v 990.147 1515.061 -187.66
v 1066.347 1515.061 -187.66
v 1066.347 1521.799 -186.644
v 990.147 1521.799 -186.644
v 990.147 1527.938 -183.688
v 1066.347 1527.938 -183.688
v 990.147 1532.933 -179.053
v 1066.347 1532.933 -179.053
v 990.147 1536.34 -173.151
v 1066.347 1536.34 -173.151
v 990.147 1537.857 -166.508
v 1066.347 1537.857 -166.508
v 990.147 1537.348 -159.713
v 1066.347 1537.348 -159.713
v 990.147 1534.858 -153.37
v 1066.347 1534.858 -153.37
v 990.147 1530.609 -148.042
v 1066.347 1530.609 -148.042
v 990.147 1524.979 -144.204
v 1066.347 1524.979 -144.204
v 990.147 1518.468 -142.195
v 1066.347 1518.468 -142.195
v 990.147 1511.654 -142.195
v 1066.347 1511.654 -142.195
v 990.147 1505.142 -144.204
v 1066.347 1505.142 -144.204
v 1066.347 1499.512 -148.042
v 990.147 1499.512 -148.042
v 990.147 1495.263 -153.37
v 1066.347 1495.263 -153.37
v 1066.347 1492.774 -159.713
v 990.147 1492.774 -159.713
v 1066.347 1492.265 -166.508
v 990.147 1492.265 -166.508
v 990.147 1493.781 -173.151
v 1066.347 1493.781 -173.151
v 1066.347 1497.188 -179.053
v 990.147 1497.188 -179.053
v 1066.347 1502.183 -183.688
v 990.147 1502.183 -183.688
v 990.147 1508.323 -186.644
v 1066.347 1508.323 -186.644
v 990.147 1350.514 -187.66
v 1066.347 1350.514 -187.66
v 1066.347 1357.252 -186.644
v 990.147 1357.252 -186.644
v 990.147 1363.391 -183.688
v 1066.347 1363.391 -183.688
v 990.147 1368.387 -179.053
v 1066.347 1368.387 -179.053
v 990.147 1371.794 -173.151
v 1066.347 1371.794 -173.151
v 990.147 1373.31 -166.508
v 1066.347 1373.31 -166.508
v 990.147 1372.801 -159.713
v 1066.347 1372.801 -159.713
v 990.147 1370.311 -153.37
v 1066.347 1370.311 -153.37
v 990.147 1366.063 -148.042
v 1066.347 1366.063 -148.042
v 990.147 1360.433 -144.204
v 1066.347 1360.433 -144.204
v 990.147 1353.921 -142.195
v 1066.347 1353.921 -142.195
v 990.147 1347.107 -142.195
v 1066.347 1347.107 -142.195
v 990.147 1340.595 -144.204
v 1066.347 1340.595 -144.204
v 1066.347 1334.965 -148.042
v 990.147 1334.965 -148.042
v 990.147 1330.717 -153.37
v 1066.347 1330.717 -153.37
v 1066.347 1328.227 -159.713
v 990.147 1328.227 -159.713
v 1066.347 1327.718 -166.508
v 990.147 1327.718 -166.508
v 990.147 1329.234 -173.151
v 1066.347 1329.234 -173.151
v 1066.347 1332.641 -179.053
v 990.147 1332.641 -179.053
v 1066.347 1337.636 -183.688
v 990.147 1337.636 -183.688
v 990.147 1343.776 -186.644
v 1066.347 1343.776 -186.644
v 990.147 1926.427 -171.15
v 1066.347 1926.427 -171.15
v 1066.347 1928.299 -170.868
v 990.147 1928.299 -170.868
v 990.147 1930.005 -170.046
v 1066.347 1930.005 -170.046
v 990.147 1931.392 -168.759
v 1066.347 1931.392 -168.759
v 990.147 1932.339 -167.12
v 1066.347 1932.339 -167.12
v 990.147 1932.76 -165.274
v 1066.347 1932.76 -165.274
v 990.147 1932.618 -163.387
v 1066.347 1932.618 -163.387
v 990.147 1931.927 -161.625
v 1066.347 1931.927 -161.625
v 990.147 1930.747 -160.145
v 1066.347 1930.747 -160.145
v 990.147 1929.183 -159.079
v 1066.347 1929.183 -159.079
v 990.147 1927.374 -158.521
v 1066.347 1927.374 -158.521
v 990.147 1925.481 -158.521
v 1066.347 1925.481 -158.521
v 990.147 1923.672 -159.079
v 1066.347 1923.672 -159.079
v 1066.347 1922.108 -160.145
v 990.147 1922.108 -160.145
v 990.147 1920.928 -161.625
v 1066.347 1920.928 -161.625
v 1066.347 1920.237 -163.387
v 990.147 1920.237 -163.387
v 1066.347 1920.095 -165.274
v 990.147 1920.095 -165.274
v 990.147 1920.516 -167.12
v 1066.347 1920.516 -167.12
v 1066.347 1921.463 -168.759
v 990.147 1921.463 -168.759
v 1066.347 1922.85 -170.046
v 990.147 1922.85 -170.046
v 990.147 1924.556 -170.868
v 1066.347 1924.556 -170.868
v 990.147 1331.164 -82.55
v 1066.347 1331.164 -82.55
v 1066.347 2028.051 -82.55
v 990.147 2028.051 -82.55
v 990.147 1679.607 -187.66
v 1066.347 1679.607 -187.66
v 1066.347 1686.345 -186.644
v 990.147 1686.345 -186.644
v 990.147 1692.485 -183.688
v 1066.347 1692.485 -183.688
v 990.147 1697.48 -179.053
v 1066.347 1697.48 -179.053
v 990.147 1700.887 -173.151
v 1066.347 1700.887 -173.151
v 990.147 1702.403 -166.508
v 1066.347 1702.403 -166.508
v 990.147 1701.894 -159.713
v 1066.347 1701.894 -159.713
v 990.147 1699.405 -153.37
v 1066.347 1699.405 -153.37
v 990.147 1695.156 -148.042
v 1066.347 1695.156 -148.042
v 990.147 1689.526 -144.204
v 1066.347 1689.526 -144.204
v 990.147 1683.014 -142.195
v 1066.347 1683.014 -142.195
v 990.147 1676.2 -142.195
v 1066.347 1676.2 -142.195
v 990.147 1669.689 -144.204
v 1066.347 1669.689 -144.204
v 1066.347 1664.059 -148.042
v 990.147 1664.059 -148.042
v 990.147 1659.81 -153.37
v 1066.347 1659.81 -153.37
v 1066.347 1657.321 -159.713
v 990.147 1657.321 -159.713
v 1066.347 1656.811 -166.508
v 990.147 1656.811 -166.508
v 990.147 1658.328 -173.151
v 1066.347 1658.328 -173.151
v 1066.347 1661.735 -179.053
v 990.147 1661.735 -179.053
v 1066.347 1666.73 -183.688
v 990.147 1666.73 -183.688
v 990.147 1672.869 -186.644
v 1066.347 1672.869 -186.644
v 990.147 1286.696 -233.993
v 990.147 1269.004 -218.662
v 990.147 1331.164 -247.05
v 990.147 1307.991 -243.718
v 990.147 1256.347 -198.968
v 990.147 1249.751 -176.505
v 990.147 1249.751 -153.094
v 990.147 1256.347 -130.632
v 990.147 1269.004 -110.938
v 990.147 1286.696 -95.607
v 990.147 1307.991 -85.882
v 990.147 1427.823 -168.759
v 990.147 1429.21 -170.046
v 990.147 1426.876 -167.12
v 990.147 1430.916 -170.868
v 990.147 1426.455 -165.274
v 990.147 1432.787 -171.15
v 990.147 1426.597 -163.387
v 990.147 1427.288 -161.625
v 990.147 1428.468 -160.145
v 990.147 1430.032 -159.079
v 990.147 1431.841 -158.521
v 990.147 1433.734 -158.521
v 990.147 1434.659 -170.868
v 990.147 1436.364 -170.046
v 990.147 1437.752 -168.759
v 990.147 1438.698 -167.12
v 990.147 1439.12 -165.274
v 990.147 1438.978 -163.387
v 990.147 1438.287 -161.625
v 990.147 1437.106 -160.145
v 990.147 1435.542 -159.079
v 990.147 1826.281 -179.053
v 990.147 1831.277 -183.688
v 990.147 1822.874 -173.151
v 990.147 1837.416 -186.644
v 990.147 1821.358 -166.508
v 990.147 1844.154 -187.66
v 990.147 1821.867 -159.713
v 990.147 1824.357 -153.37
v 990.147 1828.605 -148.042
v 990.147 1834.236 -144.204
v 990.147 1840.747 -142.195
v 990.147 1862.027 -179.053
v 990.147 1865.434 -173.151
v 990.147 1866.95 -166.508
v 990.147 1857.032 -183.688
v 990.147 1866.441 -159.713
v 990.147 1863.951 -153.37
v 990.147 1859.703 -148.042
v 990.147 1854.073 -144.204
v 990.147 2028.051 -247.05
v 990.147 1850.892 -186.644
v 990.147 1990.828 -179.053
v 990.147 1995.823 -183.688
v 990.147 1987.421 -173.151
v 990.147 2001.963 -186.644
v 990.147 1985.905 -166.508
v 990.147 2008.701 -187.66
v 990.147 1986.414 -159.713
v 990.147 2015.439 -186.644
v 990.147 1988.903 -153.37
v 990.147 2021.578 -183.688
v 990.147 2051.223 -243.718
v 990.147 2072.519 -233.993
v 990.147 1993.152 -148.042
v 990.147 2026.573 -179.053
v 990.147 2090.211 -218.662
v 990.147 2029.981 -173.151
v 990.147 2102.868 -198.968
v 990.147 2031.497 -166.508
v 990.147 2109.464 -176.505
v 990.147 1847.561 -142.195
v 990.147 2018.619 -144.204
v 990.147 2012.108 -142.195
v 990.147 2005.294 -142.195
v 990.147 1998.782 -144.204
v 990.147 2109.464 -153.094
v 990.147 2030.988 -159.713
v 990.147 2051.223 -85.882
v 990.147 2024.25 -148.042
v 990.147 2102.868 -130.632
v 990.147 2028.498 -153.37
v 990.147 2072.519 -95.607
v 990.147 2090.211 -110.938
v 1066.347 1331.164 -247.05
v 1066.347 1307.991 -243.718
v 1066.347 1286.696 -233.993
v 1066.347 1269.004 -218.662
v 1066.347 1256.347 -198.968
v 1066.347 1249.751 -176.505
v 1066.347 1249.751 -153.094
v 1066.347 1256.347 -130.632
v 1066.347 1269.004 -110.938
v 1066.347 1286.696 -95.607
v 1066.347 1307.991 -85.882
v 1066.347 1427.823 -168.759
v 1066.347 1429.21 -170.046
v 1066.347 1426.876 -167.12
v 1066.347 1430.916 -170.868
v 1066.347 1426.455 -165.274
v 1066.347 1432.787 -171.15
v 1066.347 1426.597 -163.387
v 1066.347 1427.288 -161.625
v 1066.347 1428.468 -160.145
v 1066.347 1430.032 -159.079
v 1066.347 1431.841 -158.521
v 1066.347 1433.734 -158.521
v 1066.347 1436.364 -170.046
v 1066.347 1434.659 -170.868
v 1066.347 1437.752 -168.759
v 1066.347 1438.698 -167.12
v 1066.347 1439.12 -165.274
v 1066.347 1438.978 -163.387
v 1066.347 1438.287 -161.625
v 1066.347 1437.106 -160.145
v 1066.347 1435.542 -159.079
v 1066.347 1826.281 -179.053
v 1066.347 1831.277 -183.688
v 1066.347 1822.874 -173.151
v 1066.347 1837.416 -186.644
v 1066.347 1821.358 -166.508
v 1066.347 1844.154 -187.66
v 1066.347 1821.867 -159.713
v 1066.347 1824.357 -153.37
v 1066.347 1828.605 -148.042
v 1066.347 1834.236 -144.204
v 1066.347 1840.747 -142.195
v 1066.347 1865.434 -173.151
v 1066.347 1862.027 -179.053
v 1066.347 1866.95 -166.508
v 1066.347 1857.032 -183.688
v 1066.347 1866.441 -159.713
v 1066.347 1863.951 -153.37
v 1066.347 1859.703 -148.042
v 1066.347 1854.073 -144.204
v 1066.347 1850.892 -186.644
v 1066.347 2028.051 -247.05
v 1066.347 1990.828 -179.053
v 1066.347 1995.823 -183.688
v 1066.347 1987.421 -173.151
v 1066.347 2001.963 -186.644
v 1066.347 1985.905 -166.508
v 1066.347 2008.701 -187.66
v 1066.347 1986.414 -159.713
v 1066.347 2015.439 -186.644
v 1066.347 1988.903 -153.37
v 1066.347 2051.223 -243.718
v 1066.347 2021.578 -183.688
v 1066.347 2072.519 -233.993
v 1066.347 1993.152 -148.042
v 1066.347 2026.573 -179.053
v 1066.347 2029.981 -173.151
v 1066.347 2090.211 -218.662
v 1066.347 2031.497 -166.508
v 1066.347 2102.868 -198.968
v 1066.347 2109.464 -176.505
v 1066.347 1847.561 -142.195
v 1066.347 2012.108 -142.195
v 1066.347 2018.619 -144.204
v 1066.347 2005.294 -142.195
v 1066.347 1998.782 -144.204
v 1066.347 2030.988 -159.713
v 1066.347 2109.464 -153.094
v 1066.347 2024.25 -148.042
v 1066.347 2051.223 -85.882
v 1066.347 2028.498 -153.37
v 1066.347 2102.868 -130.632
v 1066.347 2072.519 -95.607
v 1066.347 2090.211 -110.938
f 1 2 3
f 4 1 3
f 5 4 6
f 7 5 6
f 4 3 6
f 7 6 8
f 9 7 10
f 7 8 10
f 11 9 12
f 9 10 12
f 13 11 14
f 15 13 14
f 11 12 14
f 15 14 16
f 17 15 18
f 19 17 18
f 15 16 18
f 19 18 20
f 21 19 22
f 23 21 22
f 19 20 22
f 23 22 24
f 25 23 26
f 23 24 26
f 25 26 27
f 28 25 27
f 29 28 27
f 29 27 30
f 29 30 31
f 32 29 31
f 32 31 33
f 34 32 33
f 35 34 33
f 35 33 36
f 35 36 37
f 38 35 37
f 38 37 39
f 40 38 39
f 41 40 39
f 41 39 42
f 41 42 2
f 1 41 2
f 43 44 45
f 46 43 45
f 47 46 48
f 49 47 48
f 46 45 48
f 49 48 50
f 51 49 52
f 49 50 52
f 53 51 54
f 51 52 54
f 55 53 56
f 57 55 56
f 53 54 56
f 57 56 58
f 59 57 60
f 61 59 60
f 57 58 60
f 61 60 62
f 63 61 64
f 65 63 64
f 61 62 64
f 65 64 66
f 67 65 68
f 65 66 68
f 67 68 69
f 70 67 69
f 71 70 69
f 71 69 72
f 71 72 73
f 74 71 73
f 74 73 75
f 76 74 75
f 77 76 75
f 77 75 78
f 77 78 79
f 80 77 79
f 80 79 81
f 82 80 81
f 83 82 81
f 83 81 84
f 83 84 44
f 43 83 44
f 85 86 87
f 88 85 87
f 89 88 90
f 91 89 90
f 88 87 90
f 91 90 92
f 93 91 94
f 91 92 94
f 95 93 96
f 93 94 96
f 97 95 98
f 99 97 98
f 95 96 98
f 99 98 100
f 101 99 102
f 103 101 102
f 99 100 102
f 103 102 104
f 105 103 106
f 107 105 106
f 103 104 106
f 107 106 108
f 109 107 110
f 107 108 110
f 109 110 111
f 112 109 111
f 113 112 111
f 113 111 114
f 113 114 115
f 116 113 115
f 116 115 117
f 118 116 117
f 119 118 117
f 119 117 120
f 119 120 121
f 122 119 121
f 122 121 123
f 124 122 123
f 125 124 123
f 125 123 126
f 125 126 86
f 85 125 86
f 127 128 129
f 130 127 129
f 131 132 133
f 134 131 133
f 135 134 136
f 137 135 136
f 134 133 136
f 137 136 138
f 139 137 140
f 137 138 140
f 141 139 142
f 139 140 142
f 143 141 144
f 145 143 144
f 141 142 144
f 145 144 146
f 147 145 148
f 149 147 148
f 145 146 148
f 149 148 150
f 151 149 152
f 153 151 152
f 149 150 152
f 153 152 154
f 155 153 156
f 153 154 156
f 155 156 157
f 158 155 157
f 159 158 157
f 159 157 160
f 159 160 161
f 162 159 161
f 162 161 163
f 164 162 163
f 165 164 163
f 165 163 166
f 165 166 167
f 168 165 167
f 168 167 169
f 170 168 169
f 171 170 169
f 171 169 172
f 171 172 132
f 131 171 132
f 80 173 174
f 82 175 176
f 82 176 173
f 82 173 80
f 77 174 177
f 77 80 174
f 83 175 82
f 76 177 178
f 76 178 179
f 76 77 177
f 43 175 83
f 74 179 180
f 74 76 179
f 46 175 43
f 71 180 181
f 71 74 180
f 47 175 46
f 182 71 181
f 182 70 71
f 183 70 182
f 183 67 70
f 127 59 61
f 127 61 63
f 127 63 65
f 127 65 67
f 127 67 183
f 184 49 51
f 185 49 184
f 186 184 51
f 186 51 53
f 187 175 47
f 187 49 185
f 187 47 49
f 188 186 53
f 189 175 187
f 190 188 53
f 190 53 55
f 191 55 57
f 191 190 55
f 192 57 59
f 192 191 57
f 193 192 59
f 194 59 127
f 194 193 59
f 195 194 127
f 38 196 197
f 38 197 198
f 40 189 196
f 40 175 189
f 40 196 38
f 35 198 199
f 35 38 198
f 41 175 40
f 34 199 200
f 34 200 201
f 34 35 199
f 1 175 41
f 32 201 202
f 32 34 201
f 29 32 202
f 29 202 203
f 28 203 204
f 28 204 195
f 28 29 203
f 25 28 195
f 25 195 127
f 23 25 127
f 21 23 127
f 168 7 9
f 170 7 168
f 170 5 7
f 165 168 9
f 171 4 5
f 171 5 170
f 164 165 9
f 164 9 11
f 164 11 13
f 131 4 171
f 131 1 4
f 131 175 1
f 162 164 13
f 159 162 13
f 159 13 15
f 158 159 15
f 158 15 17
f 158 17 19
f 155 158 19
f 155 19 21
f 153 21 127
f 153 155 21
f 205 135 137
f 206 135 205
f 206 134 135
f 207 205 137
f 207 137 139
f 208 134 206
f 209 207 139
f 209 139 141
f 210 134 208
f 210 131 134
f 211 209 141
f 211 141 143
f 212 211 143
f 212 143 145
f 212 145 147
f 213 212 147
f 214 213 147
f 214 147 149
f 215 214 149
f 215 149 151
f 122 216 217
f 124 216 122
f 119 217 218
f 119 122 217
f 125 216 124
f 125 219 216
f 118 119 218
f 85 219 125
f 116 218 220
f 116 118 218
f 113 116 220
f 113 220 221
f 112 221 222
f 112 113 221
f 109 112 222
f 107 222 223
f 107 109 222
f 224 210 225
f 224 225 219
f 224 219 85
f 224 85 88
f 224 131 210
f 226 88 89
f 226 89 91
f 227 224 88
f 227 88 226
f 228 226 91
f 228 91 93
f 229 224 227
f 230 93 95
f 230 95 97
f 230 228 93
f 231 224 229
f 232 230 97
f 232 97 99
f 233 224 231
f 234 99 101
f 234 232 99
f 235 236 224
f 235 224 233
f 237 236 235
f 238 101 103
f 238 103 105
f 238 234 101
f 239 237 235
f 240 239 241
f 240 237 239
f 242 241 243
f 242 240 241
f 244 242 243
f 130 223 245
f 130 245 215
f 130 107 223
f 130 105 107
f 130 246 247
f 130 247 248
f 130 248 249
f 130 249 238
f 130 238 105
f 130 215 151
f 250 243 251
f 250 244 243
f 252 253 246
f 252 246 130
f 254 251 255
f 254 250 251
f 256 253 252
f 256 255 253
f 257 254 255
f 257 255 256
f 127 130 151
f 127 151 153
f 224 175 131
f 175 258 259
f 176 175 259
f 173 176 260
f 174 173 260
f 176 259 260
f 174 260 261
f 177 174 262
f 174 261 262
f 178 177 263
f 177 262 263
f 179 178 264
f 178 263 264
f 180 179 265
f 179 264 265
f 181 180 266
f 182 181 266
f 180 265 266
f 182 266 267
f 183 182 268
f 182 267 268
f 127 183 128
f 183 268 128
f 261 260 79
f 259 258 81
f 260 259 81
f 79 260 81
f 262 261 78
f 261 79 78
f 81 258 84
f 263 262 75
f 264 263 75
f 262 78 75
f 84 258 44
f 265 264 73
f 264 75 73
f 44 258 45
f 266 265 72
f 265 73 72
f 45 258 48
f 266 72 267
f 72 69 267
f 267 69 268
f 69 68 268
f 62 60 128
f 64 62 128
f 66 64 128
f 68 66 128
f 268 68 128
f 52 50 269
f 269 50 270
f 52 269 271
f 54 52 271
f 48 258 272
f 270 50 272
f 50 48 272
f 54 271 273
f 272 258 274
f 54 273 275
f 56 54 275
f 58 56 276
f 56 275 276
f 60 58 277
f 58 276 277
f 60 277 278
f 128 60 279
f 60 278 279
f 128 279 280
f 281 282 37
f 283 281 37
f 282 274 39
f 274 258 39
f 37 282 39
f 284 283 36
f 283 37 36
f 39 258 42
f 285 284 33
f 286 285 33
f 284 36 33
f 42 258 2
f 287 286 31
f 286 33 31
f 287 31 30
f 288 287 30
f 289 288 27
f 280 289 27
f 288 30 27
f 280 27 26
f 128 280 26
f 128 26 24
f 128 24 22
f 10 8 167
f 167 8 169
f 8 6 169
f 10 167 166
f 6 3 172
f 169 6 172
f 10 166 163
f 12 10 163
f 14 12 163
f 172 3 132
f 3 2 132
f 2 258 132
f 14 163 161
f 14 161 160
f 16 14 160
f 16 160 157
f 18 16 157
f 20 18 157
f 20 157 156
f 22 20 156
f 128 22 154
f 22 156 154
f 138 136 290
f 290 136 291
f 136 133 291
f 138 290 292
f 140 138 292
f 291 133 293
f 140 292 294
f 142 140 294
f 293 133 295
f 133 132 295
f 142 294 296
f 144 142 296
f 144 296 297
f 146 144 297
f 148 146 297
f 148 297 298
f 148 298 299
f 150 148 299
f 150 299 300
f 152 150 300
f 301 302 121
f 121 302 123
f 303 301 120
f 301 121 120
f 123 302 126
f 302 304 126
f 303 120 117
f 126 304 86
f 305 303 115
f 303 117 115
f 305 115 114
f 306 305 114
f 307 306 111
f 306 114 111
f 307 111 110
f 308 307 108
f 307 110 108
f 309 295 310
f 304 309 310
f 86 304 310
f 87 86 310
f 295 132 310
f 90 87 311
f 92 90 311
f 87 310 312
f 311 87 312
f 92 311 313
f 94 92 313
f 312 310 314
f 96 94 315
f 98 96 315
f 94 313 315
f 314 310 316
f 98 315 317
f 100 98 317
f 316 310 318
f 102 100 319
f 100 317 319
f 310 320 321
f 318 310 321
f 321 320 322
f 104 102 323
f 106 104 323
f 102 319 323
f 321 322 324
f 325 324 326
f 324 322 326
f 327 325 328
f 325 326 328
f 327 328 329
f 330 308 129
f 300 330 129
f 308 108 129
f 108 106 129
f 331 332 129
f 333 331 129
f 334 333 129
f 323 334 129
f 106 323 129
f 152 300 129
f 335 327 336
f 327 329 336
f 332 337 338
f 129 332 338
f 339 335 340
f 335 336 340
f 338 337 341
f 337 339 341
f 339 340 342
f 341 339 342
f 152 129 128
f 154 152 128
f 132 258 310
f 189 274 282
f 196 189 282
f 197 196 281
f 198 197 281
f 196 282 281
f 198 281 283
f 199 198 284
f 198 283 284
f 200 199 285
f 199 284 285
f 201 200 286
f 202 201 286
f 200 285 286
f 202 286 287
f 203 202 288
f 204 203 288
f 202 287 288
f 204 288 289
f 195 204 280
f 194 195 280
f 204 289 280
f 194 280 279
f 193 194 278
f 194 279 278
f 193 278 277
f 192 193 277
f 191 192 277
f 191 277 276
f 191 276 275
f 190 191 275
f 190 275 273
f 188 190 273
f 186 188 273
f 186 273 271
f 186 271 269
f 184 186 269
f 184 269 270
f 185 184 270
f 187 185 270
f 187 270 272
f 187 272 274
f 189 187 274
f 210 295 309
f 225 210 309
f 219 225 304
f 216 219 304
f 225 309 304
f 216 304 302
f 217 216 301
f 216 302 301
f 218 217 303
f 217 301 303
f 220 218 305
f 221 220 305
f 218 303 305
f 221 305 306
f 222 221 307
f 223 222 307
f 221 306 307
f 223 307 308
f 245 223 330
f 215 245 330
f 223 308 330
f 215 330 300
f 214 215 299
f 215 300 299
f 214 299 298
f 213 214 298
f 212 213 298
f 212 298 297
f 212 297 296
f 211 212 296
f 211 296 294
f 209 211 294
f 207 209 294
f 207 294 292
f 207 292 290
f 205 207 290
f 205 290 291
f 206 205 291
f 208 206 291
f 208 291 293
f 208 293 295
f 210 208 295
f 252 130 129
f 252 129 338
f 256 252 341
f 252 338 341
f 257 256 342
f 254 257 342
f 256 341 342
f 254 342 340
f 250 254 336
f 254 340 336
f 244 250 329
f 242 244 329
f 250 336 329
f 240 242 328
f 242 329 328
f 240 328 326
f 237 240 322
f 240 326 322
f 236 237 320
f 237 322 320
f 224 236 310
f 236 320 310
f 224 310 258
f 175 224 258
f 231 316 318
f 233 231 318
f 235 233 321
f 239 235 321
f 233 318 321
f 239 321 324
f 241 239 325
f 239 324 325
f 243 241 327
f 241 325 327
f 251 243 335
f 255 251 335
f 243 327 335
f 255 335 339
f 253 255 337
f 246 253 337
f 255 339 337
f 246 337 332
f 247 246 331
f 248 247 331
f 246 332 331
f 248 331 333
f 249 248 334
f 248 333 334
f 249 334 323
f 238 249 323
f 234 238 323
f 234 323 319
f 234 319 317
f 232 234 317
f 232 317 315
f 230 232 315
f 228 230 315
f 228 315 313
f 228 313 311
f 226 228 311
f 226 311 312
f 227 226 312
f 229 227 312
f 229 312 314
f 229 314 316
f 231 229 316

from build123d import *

# Parameters (mm, degrees)
BOSS_EXTRUDE1_DEPTH = 76.2
CUT_EXTRUDE1_REACH  = 78.2
SKETCH3_R           = 22.86
CUT_EXTRUDE2_REACH  = 78.2
SKETCH4_R           = 6.35


with BuildPart() as part:
    # Sketch2 → Boss-Extrude1 (new body)
    with BuildSketch(Plane.ZY.offset(-1066.346797213)):
        with BuildLine():
            Line((-82.55, 1331.163756946), (-82.55, 2028.051006195))
            ThreePointArc((-82.55, 2028.051006195), (-164.799803954, 2110.300810149), (-247.049607907, 2028.051006195))
            Line((-247.049607907, 2028.051006195), (-247.049607907, 1331.163756946))
            ThreePointArc((-247.049607907, 1331.163756946), (-164.799803954, 1248.913952992), (-82.55, 1331.163756946))
        make_face()
    extrude(amount=BOSS_EXTRUDE1_DEPTH)

    # Sketch3 → Cut-Extrude1 (cut, up to next)
    with BuildSketch(Plane(origin=(1066.346797213, 0, 0), x_dir=(0, 0, -1), z_dir=(1, 0, 0)), mode=Mode.PRIVATE) as cut_extrude1_sk1:
        with Locations((164.799803954, 1844.15409586)):
            Circle(SKETCH3_R)
    cut_extrude1_tool1 = extrude(cut_extrude1_sk1.sketch, amount=-CUT_EXTRUDE1_REACH, mode=Mode.PRIVATE) & part.part
    add(cut_extrude1_tool1.solids().sort_by_distance((1066.346797, 1844.154096, -164.799804))[0], mode=Mode.SUBTRACT)
    # Sketch3 → Cut-Extrude1 (cut, up to next)
    with BuildSketch(Plane(origin=(1066.346797213, 0, 0), x_dir=(0, 0, -1), z_dir=(1, 0, 0)), mode=Mode.PRIVATE) as cut_extrude1_sk2:
        with Locations((164.799803954, 1679.607381571)):
            Circle(SKETCH3_R)
    cut_extrude1_tool2 = extrude(cut_extrude1_sk2.sketch, amount=-CUT_EXTRUDE1_REACH, mode=Mode.PRIVATE) & part.part
    add(cut_extrude1_tool2.solids().sort_by_distance((1066.346797, 1679.607382, -164.799804))[0], mode=Mode.SUBTRACT)
    # Sketch3 → Cut-Extrude1 (cut, up to next)
    with BuildSketch(Plane(origin=(1066.346797213, 0, 0), x_dir=(0, 0, -1), z_dir=(1, 0, 0)), mode=Mode.PRIVATE) as cut_extrude1_sk3:
        with Locations((164.799803954, 2008.700810149)):
            Circle(SKETCH3_R)
    cut_extrude1_tool3 = extrude(cut_extrude1_sk3.sketch, amount=-CUT_EXTRUDE1_REACH, mode=Mode.PRIVATE) & part.part
    add(cut_extrude1_tool3.solids().sort_by_distance((1066.346797, 2008.70081, -164.799804))[0], mode=Mode.SUBTRACT)
    # Sketch3 → Cut-Extrude1 (cut, up to next)
    with BuildSketch(Plane(origin=(1066.346797213, 0, 0), x_dir=(0, 0, -1), z_dir=(1, 0, 0)), mode=Mode.PRIVATE) as cut_extrude1_sk4:
        with Locations((164.799803954, 1515.060667281)):
            Circle(SKETCH3_R)
    cut_extrude1_tool4 = extrude(cut_extrude1_sk4.sketch, amount=-CUT_EXTRUDE1_REACH, mode=Mode.PRIVATE) & part.part
    add(cut_extrude1_tool4.solids().sort_by_distance((1066.346797, 1515.060667, -164.799804))[0], mode=Mode.SUBTRACT)
    # Sketch3 → Cut-Extrude1 (cut, up to next)
    with BuildSketch(Plane(origin=(1066.346797213, 0, 0), x_dir=(0, 0, -1), z_dir=(1, 0, 0)), mode=Mode.PRIVATE) as cut_extrude1_sk5:
        with Locations((164.799803954, 1350.513952992)):
            Circle(SKETCH3_R)
    cut_extrude1_tool5 = extrude(cut_extrude1_sk5.sketch, amount=-CUT_EXTRUDE1_REACH, mode=Mode.PRIVATE) & part.part
    add(cut_extrude1_tool5.solids().sort_by_distance((1066.346797, 1350.513953, -164.799804))[0], mode=Mode.SUBTRACT)

    # Sketch4 → Cut-Extrude2 (cut, up to next)
    with BuildSketch(Plane(origin=(1066.346797213, 0, 0), x_dir=(0, 0, -1), z_dir=(1, 0, 0)), mode=Mode.PRIVATE) as cut_extrude2_sk1:
        with Locations((164.799803954, 1926.427453004)):
            Circle(SKETCH4_R)
    cut_extrude2_tool1 = extrude(cut_extrude2_sk1.sketch, amount=-CUT_EXTRUDE2_REACH, mode=Mode.PRIVATE) & part.part
    add(cut_extrude2_tool1.solids().sort_by_distance((1066.346797, 1926.427453, -164.799804))[0], mode=Mode.SUBTRACT)
    # Sketch4 → Cut-Extrude2 (cut, up to next)
    with BuildSketch(Plane(origin=(1066.346797213, 0, 0), x_dir=(0, 0, -1), z_dir=(1, 0, 0)), mode=Mode.PRIVATE) as cut_extrude2_sk2:
        with Locations((164.799803954, 1432.787310137)):
            Circle(SKETCH4_R)
    cut_extrude2_tool2 = extrude(cut_extrude2_sk2.sketch, amount=-CUT_EXTRUDE2_REACH, mode=Mode.PRIVATE) & part.part
    add(cut_extrude2_tool2.solids().sort_by_distance((1066.346797, 1432.78731, -164.799804))[0], mode=Mode.SUBTRACT)


solid = part.part
